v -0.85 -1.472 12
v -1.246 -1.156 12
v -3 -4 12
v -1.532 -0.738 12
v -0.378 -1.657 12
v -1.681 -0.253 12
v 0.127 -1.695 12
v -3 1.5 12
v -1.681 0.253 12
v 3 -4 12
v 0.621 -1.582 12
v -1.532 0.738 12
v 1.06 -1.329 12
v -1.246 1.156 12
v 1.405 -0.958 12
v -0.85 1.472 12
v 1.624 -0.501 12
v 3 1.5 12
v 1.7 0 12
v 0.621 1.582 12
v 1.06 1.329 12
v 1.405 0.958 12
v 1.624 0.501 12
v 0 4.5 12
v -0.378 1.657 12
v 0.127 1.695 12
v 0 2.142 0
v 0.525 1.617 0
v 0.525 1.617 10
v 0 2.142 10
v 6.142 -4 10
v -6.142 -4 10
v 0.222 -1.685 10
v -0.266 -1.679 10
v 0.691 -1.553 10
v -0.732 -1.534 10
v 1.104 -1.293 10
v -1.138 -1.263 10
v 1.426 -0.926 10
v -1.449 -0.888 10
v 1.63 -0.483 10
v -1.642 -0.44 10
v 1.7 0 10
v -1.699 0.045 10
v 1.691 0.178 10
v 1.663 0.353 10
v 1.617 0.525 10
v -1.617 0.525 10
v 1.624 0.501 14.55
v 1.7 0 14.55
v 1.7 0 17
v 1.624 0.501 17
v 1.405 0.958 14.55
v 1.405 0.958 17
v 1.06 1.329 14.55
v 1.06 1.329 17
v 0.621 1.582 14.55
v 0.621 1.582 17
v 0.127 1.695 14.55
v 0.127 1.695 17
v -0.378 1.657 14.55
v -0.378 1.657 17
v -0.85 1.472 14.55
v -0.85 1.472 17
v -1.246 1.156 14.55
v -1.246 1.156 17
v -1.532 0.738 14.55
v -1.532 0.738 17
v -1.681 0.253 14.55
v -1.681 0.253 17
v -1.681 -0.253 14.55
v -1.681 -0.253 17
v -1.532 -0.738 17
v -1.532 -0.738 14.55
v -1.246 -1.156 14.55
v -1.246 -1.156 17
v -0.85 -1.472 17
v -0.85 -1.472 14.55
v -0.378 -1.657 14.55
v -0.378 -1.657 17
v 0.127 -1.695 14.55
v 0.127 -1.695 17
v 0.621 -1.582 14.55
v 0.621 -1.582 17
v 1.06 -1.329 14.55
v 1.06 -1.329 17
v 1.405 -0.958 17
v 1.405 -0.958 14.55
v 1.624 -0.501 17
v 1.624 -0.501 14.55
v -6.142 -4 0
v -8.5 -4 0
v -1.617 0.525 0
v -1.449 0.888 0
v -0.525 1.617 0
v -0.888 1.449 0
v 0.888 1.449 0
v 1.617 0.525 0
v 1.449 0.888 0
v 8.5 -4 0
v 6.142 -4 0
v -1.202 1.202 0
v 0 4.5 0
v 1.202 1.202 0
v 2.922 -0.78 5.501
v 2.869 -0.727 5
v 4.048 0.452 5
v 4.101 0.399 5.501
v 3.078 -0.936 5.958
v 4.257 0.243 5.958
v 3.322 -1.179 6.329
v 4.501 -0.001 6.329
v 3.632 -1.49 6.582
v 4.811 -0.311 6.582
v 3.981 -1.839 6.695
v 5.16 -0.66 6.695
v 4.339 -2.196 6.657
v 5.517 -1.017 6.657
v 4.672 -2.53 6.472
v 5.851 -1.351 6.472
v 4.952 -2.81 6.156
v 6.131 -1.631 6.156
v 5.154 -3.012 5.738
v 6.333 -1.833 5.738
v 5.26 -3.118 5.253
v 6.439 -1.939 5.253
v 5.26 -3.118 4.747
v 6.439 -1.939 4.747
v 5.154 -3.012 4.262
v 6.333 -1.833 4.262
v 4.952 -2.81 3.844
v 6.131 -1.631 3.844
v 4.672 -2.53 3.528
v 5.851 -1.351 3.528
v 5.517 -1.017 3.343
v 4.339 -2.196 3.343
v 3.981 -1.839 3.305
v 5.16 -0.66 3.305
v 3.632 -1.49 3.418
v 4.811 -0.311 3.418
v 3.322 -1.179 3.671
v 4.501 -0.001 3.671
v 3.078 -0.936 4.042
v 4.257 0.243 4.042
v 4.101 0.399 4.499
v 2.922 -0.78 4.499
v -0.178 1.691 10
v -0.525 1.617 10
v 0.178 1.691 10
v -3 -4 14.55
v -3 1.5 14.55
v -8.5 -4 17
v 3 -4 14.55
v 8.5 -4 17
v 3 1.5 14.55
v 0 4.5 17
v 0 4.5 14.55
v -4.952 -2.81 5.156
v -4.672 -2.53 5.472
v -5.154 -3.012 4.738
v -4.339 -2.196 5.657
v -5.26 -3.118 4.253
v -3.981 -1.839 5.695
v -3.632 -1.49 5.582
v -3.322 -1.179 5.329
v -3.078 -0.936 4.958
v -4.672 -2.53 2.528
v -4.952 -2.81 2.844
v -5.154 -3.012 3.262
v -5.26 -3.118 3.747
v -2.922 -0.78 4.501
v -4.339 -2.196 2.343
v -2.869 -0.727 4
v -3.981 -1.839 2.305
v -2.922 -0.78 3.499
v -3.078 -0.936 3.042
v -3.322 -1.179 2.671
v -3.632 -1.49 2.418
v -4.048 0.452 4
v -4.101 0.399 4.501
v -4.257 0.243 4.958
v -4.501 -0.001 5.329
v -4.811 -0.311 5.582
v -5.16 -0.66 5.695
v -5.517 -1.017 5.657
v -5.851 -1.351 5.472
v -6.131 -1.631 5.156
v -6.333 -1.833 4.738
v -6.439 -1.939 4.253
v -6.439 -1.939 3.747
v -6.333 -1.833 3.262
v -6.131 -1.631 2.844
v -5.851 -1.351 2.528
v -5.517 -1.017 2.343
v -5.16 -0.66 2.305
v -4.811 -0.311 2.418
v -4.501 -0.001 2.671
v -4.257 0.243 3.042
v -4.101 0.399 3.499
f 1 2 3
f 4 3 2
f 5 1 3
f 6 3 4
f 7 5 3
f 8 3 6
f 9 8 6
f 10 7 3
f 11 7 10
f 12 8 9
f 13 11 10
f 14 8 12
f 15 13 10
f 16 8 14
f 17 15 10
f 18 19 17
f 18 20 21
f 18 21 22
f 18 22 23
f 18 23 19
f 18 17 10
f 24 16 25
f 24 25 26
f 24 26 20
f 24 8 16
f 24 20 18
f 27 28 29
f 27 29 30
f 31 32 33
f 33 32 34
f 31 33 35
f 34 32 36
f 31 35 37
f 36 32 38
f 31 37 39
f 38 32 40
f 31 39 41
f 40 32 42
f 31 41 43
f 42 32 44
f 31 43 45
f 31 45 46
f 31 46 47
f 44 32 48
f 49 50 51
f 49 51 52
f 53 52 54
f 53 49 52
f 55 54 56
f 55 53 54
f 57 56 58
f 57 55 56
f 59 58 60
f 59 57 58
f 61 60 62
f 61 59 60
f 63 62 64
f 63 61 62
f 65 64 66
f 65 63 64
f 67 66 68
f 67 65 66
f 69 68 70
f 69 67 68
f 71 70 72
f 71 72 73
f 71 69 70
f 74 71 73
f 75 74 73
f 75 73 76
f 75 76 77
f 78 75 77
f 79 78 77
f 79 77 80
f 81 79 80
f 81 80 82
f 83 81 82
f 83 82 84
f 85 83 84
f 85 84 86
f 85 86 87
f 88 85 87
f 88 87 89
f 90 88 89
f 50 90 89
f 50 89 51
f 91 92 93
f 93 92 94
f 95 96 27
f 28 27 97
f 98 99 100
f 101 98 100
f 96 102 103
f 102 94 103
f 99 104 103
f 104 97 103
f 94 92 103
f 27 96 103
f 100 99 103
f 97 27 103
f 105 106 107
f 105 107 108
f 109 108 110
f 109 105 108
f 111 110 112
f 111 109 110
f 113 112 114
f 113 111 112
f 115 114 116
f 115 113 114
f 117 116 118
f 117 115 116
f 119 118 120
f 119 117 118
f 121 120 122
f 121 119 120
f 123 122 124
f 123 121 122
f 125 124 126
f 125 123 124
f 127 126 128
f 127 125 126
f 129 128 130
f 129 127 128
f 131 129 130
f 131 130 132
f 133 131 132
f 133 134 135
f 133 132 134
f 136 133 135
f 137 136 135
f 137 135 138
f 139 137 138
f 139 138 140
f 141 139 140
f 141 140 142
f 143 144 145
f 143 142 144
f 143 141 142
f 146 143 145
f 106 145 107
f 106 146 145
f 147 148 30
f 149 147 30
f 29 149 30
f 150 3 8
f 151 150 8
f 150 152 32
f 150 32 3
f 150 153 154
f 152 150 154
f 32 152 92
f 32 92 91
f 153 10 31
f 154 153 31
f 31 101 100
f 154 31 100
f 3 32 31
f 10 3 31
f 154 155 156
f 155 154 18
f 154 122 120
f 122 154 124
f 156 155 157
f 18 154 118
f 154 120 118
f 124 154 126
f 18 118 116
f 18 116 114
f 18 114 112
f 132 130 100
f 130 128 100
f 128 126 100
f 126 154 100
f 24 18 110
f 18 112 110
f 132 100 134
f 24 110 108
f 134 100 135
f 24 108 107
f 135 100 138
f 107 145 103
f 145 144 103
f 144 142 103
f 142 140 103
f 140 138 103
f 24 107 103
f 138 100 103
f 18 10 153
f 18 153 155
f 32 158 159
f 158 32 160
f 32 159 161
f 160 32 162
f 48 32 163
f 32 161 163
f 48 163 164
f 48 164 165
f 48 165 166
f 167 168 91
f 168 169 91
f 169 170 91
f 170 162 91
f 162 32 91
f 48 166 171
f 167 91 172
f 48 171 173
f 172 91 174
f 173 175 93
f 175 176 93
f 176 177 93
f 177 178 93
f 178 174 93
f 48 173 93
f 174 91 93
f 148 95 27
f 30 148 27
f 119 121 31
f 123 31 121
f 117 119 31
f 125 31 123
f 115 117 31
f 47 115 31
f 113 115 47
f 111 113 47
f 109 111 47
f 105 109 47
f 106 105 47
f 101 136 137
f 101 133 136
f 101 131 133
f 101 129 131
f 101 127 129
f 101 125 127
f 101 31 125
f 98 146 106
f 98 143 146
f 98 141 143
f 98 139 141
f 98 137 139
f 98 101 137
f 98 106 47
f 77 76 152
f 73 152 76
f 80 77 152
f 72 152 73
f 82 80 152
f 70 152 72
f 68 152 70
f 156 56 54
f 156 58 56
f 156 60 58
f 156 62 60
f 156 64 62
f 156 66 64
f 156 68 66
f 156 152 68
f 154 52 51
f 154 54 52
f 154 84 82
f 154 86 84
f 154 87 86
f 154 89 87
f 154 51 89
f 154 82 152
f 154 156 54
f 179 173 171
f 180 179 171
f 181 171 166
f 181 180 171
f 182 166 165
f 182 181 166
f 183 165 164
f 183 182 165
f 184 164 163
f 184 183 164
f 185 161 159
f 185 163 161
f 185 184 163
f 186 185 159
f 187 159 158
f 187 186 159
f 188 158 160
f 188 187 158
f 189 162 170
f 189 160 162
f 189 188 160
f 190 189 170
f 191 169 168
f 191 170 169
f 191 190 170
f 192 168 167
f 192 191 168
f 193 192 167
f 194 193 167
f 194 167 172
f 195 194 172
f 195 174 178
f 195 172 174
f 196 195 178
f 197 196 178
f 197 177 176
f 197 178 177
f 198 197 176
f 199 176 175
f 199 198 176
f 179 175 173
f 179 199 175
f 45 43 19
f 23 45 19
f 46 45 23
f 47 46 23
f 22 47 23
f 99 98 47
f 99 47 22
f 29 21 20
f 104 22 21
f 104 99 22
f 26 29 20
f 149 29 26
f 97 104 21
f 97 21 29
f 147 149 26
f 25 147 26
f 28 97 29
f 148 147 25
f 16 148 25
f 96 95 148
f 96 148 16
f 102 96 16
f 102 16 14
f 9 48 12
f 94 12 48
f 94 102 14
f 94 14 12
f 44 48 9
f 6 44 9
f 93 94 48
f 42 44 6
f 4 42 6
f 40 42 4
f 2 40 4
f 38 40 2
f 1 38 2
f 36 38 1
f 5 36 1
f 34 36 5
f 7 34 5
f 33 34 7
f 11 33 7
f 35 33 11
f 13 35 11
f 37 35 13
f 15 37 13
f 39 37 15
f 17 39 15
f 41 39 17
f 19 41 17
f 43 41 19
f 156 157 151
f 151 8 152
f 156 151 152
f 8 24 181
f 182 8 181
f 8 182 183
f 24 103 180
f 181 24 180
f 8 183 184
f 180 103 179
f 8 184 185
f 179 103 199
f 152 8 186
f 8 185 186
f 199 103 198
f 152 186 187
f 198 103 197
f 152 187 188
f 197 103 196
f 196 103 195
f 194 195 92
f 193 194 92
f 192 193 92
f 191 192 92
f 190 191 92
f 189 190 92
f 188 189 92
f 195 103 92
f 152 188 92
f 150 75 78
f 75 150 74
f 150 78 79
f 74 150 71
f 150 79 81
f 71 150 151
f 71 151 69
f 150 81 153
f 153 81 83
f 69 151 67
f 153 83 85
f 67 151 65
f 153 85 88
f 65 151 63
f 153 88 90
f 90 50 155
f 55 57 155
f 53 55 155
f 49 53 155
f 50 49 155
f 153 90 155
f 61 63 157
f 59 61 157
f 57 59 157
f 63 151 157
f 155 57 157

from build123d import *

# Parameters (mm, degrees)
SKETCH048_R       = 1.7
PAD023_DEPTH      = 17
BOX_W             = 6
BOX_H             = 20
BOX_DEPTH         = 2.55
BOX001_W          = 10
BOX001_H          = 10
BOX001_DEPTH      = 30
CYLINDER_R        = 1.7
CYLINDER_DEPTH    = 10
CYLINDER001_R     = 1.7
CYLINDER001_DEPTH = 11


with BuildPart() as part:
    # Sketch048 → Pad023 (new body)
    with BuildSketch(Plane.XY):
        Polygon((0, 4.5), (-8.5, -4), (8.5, -4), align=None)
        Circle(SKETCH048_R, mode=Mode.SUBTRACT)
    extrude(amount=PAD023_DEPTH)

    # Box → Box (cut)
    with BuildSketch(Plane(origin=(-3, -6, 12), x_dir=(1, 0, 0), z_dir=(0, 0, 1))):
        with Locations((3, 10)):
            Rectangle(BOX_W, BOX_H)
    extrude(amount=BOX_DEPTH, mode=Mode.SUBTRACT)

    # Box001 → Box001 (cut)
    with BuildSketch(Plane(origin=(0, -12, -20), x_dir=(0.707107, 0.707107, 0), z_dir=(0, 0, 1))):
        with Locations((5, 5)):
            Rectangle(BOX001_W, BOX001_H)
    extrude(amount=BOX001_DEPTH, mode=Mode.SUBTRACT)

    # Cylinder → Cylinder (cut)
    with BuildSketch(Plane(origin=(2, -4, 5), x_dir=(-0.707107, 0.707107, 0), z_dir=(0.707107, 0.707107, 0))):
        Circle(CYLINDER_R)
    extrude(amount=CYLINDER_DEPTH, mode=Mode.SUBTRACT)

    # Cylinder001 → Cylinder001 (cut)
    with BuildSketch(Plane(origin=(-10, 4, 4), x_dir=(0.707107, 0.707107, 0), z_dir=(0.707107, -0.707107, 0))):
        Circle(CYLINDER001_R)
    extrude(amount=CYLINDER001_DEPTH, mode=Mode.SUBTRACT)


solid = part.part
